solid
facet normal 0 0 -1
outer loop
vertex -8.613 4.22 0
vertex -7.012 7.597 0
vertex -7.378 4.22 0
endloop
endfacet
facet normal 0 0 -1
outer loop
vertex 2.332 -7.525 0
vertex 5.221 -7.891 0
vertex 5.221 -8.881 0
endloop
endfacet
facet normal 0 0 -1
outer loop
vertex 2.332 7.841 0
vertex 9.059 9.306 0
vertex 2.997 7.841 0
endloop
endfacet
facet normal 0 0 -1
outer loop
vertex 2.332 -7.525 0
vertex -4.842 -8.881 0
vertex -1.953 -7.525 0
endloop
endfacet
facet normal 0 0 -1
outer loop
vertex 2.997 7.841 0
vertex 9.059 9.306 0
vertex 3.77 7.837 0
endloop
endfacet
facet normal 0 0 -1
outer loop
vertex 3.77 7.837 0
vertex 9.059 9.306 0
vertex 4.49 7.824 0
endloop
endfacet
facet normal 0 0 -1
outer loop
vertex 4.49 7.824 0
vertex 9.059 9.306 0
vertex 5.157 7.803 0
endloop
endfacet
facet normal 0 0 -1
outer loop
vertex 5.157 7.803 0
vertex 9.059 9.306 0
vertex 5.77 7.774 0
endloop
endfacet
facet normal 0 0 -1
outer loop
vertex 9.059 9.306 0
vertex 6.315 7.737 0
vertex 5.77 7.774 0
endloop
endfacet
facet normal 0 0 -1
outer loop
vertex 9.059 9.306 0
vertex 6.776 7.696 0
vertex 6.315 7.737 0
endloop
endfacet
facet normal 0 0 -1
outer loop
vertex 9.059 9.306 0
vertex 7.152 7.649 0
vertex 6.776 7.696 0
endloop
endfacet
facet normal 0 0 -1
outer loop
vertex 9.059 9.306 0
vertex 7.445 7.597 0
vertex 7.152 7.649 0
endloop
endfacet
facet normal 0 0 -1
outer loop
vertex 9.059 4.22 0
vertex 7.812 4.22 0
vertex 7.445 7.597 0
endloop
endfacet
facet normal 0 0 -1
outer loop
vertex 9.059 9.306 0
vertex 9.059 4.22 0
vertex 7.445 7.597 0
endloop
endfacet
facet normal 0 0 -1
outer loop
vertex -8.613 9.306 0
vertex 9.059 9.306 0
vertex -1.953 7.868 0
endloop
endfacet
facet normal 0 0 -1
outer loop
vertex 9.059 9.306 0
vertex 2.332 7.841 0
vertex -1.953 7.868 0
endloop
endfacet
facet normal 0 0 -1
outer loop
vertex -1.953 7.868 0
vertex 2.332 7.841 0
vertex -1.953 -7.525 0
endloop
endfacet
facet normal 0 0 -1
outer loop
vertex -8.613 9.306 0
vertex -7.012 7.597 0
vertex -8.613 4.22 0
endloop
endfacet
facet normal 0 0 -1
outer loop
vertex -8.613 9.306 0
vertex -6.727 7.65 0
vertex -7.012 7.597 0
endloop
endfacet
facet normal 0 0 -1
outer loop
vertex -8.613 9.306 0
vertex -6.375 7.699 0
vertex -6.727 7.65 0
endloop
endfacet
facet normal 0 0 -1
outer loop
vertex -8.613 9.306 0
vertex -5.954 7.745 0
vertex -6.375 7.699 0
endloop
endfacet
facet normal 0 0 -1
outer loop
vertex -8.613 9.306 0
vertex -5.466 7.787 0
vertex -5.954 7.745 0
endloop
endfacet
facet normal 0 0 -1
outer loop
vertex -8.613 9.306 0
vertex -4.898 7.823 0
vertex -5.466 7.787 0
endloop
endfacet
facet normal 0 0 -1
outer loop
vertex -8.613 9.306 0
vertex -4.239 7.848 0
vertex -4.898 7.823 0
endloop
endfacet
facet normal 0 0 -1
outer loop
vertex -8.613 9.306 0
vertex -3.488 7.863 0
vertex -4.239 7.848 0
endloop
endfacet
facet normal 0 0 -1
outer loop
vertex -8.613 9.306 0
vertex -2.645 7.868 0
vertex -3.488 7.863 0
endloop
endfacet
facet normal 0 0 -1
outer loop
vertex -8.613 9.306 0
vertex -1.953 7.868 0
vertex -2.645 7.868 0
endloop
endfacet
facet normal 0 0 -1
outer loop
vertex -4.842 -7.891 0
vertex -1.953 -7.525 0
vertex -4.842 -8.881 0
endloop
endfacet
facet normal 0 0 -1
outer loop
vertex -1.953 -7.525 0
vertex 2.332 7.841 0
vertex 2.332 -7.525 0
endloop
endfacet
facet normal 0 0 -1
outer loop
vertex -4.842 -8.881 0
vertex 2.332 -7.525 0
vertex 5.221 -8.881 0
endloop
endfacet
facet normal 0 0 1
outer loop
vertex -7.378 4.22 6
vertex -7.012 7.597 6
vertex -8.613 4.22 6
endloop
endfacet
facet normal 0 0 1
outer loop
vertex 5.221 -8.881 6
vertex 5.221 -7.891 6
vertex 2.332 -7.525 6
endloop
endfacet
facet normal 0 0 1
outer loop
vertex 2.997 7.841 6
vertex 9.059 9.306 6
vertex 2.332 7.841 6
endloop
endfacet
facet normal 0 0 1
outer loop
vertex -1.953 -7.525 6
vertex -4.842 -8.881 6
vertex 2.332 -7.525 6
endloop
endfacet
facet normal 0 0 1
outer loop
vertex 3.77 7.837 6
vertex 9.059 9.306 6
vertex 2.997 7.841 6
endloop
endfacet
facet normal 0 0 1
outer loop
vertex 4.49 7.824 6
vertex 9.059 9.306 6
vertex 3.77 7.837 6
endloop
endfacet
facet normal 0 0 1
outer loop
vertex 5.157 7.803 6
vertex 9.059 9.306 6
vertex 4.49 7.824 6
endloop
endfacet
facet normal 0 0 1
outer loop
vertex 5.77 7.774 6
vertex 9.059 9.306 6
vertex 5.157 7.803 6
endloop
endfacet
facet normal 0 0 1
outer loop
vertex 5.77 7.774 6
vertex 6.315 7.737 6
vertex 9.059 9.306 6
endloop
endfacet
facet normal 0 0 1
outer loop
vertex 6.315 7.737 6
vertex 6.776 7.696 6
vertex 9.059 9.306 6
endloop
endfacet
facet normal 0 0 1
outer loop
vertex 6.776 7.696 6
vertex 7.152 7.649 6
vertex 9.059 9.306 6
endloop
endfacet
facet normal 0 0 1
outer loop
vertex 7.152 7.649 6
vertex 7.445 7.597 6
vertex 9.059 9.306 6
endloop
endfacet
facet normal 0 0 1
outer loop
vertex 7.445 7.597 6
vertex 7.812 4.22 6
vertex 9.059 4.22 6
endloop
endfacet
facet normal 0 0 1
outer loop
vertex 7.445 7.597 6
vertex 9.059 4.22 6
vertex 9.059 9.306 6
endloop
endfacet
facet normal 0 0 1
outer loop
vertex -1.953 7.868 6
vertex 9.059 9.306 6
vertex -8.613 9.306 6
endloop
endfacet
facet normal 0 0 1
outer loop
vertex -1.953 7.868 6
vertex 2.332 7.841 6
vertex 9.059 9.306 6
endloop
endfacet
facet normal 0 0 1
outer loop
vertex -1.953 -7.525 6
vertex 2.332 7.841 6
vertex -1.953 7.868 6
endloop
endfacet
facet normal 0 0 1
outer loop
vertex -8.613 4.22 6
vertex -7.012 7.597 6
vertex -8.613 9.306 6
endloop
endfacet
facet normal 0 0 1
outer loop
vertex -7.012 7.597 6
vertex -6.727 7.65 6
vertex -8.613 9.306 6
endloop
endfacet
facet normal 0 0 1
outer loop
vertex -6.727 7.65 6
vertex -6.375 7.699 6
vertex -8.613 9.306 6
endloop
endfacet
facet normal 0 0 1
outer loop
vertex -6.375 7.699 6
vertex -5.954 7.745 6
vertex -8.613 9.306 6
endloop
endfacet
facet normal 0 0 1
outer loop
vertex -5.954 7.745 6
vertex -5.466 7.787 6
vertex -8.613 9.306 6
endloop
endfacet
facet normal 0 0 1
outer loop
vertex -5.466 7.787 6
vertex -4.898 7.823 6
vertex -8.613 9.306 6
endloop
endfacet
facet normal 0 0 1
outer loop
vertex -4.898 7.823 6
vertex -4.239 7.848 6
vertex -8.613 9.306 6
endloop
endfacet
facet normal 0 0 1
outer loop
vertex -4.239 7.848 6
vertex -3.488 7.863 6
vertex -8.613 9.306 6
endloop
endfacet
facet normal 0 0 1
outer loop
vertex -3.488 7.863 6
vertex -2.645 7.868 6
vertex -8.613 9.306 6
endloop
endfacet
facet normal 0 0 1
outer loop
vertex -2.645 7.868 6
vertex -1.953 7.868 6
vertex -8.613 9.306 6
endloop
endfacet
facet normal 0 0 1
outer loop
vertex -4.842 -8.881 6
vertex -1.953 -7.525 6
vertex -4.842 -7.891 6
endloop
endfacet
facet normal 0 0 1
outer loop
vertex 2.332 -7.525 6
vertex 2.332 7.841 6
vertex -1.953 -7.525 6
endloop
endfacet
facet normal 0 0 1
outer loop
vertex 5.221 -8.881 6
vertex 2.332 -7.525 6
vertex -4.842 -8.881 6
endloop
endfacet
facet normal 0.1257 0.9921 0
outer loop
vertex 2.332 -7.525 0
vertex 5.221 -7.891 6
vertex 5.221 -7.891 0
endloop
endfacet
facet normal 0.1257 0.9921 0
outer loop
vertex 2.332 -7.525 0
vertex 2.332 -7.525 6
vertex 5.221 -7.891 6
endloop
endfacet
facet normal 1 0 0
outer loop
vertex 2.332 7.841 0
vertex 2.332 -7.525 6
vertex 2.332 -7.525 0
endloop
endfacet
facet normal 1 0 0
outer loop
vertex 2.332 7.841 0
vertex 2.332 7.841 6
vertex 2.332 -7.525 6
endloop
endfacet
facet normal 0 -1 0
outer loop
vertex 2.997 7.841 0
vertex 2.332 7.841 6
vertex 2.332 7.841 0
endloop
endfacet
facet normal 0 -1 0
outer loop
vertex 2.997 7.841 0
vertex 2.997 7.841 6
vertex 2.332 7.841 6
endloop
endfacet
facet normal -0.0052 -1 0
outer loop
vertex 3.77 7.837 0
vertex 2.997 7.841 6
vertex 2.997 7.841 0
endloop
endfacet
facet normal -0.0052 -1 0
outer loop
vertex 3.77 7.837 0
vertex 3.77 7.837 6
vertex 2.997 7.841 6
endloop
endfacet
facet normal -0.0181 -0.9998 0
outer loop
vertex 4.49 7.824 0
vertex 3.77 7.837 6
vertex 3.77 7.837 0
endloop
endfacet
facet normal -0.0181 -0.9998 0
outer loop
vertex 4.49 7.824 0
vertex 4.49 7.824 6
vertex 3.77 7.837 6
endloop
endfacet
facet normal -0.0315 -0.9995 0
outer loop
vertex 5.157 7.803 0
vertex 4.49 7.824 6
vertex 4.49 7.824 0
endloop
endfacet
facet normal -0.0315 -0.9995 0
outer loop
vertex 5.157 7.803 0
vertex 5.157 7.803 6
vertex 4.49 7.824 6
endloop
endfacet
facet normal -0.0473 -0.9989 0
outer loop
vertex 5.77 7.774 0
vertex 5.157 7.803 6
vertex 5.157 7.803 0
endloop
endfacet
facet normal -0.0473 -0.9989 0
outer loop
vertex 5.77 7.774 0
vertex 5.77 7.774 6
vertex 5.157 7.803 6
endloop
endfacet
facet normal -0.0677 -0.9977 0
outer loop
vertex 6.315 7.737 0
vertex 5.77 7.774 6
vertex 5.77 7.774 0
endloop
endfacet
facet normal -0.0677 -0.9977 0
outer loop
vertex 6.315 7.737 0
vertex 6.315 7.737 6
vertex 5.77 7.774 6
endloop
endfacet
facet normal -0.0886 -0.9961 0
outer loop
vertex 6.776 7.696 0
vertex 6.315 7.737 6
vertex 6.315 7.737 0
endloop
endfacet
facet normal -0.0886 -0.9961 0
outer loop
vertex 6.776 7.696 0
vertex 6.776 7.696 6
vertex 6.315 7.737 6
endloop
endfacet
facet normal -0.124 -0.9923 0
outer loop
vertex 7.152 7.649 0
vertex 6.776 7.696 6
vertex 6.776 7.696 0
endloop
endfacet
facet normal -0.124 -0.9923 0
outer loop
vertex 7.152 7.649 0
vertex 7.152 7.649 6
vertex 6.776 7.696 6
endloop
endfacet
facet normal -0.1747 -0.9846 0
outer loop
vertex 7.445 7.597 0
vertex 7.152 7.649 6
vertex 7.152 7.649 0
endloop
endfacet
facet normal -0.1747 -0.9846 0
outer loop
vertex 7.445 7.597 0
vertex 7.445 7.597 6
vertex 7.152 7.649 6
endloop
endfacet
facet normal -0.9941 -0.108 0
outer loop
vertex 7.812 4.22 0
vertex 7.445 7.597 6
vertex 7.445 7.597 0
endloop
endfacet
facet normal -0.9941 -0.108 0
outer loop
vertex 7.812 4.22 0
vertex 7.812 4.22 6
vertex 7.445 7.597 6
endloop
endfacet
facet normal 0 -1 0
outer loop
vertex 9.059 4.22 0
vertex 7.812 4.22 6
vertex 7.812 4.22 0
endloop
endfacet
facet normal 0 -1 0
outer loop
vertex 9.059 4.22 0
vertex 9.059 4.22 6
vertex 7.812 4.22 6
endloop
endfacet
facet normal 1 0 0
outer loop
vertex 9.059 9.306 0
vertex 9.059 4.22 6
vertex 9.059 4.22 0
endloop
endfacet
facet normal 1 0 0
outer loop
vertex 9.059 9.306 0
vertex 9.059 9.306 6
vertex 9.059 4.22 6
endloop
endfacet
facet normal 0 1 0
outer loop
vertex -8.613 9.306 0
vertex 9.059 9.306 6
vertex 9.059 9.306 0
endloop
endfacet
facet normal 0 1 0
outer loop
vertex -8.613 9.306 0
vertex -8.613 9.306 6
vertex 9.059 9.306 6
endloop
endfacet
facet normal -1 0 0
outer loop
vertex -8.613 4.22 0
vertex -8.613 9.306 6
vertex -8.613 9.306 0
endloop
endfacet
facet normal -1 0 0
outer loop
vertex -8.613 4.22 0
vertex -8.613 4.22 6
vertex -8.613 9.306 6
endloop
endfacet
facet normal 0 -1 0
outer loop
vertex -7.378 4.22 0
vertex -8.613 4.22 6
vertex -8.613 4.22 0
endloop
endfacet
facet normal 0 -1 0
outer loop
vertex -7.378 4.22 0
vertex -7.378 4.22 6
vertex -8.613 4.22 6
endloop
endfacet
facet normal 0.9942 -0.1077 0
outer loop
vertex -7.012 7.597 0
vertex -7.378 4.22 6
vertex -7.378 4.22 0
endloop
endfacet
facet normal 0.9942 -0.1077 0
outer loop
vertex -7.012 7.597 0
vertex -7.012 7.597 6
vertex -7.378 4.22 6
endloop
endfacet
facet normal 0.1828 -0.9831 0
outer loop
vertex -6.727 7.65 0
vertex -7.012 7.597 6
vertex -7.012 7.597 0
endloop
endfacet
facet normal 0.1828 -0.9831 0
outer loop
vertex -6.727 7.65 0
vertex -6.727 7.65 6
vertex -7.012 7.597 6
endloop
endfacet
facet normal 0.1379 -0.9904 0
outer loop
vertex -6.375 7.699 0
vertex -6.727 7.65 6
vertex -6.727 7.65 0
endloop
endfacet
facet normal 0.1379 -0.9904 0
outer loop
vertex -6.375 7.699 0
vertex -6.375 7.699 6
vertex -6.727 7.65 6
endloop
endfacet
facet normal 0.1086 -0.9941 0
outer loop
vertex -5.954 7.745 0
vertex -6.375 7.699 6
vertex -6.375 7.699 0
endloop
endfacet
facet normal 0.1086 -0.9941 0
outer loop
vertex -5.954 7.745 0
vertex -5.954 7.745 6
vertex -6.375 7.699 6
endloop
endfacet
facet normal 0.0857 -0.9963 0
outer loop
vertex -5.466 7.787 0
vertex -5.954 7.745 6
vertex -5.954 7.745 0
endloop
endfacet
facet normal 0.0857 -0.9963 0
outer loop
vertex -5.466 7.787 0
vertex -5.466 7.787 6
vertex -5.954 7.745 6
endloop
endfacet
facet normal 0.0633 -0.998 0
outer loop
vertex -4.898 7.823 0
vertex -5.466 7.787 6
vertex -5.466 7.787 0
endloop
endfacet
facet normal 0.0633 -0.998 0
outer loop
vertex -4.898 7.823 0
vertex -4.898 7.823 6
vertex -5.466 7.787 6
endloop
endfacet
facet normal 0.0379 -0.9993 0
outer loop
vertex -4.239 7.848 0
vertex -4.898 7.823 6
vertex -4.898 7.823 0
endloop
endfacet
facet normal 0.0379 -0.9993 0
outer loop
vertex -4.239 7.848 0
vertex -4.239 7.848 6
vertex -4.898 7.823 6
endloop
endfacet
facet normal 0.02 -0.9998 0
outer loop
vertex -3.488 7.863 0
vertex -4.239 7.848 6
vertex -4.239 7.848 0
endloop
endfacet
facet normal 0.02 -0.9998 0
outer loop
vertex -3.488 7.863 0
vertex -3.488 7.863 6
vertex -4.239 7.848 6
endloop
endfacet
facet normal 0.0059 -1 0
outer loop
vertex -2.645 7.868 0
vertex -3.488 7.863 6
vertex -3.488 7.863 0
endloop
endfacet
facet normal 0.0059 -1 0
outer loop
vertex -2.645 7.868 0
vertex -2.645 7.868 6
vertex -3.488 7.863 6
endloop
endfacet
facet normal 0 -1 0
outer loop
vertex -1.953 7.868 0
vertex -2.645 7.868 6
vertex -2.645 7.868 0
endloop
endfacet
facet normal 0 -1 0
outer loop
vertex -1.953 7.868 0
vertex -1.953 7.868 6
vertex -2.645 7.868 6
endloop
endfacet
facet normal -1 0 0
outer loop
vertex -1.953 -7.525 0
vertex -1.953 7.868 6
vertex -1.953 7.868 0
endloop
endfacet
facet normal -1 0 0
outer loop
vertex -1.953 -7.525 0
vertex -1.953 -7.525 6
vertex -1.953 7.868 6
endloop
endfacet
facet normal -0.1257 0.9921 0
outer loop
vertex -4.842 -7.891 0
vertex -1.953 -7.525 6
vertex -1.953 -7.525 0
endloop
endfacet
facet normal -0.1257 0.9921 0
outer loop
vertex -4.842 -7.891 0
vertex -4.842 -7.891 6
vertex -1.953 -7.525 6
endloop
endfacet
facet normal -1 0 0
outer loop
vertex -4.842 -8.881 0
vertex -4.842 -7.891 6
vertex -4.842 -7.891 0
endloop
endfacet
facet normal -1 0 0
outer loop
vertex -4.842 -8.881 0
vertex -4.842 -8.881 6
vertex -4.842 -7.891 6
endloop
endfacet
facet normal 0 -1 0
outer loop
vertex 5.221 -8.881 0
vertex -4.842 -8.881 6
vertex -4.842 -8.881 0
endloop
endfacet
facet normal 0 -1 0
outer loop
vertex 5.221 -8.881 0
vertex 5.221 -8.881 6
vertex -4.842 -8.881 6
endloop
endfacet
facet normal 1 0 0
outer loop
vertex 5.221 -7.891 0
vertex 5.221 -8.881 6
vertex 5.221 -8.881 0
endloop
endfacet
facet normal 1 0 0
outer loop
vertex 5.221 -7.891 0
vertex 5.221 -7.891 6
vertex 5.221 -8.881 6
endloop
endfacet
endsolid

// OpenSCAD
//=============================================================================
// Icon used for the Text model: a 3D letter 'T'.
//=============================================================================

module TextIcon() {
     linear_extrude(height = 6) {
          text(text = "T", font="Liberation Serif:style=Bold",
               size = 20, halign = "center", valign = "center");
     }
}

TextIcon();
